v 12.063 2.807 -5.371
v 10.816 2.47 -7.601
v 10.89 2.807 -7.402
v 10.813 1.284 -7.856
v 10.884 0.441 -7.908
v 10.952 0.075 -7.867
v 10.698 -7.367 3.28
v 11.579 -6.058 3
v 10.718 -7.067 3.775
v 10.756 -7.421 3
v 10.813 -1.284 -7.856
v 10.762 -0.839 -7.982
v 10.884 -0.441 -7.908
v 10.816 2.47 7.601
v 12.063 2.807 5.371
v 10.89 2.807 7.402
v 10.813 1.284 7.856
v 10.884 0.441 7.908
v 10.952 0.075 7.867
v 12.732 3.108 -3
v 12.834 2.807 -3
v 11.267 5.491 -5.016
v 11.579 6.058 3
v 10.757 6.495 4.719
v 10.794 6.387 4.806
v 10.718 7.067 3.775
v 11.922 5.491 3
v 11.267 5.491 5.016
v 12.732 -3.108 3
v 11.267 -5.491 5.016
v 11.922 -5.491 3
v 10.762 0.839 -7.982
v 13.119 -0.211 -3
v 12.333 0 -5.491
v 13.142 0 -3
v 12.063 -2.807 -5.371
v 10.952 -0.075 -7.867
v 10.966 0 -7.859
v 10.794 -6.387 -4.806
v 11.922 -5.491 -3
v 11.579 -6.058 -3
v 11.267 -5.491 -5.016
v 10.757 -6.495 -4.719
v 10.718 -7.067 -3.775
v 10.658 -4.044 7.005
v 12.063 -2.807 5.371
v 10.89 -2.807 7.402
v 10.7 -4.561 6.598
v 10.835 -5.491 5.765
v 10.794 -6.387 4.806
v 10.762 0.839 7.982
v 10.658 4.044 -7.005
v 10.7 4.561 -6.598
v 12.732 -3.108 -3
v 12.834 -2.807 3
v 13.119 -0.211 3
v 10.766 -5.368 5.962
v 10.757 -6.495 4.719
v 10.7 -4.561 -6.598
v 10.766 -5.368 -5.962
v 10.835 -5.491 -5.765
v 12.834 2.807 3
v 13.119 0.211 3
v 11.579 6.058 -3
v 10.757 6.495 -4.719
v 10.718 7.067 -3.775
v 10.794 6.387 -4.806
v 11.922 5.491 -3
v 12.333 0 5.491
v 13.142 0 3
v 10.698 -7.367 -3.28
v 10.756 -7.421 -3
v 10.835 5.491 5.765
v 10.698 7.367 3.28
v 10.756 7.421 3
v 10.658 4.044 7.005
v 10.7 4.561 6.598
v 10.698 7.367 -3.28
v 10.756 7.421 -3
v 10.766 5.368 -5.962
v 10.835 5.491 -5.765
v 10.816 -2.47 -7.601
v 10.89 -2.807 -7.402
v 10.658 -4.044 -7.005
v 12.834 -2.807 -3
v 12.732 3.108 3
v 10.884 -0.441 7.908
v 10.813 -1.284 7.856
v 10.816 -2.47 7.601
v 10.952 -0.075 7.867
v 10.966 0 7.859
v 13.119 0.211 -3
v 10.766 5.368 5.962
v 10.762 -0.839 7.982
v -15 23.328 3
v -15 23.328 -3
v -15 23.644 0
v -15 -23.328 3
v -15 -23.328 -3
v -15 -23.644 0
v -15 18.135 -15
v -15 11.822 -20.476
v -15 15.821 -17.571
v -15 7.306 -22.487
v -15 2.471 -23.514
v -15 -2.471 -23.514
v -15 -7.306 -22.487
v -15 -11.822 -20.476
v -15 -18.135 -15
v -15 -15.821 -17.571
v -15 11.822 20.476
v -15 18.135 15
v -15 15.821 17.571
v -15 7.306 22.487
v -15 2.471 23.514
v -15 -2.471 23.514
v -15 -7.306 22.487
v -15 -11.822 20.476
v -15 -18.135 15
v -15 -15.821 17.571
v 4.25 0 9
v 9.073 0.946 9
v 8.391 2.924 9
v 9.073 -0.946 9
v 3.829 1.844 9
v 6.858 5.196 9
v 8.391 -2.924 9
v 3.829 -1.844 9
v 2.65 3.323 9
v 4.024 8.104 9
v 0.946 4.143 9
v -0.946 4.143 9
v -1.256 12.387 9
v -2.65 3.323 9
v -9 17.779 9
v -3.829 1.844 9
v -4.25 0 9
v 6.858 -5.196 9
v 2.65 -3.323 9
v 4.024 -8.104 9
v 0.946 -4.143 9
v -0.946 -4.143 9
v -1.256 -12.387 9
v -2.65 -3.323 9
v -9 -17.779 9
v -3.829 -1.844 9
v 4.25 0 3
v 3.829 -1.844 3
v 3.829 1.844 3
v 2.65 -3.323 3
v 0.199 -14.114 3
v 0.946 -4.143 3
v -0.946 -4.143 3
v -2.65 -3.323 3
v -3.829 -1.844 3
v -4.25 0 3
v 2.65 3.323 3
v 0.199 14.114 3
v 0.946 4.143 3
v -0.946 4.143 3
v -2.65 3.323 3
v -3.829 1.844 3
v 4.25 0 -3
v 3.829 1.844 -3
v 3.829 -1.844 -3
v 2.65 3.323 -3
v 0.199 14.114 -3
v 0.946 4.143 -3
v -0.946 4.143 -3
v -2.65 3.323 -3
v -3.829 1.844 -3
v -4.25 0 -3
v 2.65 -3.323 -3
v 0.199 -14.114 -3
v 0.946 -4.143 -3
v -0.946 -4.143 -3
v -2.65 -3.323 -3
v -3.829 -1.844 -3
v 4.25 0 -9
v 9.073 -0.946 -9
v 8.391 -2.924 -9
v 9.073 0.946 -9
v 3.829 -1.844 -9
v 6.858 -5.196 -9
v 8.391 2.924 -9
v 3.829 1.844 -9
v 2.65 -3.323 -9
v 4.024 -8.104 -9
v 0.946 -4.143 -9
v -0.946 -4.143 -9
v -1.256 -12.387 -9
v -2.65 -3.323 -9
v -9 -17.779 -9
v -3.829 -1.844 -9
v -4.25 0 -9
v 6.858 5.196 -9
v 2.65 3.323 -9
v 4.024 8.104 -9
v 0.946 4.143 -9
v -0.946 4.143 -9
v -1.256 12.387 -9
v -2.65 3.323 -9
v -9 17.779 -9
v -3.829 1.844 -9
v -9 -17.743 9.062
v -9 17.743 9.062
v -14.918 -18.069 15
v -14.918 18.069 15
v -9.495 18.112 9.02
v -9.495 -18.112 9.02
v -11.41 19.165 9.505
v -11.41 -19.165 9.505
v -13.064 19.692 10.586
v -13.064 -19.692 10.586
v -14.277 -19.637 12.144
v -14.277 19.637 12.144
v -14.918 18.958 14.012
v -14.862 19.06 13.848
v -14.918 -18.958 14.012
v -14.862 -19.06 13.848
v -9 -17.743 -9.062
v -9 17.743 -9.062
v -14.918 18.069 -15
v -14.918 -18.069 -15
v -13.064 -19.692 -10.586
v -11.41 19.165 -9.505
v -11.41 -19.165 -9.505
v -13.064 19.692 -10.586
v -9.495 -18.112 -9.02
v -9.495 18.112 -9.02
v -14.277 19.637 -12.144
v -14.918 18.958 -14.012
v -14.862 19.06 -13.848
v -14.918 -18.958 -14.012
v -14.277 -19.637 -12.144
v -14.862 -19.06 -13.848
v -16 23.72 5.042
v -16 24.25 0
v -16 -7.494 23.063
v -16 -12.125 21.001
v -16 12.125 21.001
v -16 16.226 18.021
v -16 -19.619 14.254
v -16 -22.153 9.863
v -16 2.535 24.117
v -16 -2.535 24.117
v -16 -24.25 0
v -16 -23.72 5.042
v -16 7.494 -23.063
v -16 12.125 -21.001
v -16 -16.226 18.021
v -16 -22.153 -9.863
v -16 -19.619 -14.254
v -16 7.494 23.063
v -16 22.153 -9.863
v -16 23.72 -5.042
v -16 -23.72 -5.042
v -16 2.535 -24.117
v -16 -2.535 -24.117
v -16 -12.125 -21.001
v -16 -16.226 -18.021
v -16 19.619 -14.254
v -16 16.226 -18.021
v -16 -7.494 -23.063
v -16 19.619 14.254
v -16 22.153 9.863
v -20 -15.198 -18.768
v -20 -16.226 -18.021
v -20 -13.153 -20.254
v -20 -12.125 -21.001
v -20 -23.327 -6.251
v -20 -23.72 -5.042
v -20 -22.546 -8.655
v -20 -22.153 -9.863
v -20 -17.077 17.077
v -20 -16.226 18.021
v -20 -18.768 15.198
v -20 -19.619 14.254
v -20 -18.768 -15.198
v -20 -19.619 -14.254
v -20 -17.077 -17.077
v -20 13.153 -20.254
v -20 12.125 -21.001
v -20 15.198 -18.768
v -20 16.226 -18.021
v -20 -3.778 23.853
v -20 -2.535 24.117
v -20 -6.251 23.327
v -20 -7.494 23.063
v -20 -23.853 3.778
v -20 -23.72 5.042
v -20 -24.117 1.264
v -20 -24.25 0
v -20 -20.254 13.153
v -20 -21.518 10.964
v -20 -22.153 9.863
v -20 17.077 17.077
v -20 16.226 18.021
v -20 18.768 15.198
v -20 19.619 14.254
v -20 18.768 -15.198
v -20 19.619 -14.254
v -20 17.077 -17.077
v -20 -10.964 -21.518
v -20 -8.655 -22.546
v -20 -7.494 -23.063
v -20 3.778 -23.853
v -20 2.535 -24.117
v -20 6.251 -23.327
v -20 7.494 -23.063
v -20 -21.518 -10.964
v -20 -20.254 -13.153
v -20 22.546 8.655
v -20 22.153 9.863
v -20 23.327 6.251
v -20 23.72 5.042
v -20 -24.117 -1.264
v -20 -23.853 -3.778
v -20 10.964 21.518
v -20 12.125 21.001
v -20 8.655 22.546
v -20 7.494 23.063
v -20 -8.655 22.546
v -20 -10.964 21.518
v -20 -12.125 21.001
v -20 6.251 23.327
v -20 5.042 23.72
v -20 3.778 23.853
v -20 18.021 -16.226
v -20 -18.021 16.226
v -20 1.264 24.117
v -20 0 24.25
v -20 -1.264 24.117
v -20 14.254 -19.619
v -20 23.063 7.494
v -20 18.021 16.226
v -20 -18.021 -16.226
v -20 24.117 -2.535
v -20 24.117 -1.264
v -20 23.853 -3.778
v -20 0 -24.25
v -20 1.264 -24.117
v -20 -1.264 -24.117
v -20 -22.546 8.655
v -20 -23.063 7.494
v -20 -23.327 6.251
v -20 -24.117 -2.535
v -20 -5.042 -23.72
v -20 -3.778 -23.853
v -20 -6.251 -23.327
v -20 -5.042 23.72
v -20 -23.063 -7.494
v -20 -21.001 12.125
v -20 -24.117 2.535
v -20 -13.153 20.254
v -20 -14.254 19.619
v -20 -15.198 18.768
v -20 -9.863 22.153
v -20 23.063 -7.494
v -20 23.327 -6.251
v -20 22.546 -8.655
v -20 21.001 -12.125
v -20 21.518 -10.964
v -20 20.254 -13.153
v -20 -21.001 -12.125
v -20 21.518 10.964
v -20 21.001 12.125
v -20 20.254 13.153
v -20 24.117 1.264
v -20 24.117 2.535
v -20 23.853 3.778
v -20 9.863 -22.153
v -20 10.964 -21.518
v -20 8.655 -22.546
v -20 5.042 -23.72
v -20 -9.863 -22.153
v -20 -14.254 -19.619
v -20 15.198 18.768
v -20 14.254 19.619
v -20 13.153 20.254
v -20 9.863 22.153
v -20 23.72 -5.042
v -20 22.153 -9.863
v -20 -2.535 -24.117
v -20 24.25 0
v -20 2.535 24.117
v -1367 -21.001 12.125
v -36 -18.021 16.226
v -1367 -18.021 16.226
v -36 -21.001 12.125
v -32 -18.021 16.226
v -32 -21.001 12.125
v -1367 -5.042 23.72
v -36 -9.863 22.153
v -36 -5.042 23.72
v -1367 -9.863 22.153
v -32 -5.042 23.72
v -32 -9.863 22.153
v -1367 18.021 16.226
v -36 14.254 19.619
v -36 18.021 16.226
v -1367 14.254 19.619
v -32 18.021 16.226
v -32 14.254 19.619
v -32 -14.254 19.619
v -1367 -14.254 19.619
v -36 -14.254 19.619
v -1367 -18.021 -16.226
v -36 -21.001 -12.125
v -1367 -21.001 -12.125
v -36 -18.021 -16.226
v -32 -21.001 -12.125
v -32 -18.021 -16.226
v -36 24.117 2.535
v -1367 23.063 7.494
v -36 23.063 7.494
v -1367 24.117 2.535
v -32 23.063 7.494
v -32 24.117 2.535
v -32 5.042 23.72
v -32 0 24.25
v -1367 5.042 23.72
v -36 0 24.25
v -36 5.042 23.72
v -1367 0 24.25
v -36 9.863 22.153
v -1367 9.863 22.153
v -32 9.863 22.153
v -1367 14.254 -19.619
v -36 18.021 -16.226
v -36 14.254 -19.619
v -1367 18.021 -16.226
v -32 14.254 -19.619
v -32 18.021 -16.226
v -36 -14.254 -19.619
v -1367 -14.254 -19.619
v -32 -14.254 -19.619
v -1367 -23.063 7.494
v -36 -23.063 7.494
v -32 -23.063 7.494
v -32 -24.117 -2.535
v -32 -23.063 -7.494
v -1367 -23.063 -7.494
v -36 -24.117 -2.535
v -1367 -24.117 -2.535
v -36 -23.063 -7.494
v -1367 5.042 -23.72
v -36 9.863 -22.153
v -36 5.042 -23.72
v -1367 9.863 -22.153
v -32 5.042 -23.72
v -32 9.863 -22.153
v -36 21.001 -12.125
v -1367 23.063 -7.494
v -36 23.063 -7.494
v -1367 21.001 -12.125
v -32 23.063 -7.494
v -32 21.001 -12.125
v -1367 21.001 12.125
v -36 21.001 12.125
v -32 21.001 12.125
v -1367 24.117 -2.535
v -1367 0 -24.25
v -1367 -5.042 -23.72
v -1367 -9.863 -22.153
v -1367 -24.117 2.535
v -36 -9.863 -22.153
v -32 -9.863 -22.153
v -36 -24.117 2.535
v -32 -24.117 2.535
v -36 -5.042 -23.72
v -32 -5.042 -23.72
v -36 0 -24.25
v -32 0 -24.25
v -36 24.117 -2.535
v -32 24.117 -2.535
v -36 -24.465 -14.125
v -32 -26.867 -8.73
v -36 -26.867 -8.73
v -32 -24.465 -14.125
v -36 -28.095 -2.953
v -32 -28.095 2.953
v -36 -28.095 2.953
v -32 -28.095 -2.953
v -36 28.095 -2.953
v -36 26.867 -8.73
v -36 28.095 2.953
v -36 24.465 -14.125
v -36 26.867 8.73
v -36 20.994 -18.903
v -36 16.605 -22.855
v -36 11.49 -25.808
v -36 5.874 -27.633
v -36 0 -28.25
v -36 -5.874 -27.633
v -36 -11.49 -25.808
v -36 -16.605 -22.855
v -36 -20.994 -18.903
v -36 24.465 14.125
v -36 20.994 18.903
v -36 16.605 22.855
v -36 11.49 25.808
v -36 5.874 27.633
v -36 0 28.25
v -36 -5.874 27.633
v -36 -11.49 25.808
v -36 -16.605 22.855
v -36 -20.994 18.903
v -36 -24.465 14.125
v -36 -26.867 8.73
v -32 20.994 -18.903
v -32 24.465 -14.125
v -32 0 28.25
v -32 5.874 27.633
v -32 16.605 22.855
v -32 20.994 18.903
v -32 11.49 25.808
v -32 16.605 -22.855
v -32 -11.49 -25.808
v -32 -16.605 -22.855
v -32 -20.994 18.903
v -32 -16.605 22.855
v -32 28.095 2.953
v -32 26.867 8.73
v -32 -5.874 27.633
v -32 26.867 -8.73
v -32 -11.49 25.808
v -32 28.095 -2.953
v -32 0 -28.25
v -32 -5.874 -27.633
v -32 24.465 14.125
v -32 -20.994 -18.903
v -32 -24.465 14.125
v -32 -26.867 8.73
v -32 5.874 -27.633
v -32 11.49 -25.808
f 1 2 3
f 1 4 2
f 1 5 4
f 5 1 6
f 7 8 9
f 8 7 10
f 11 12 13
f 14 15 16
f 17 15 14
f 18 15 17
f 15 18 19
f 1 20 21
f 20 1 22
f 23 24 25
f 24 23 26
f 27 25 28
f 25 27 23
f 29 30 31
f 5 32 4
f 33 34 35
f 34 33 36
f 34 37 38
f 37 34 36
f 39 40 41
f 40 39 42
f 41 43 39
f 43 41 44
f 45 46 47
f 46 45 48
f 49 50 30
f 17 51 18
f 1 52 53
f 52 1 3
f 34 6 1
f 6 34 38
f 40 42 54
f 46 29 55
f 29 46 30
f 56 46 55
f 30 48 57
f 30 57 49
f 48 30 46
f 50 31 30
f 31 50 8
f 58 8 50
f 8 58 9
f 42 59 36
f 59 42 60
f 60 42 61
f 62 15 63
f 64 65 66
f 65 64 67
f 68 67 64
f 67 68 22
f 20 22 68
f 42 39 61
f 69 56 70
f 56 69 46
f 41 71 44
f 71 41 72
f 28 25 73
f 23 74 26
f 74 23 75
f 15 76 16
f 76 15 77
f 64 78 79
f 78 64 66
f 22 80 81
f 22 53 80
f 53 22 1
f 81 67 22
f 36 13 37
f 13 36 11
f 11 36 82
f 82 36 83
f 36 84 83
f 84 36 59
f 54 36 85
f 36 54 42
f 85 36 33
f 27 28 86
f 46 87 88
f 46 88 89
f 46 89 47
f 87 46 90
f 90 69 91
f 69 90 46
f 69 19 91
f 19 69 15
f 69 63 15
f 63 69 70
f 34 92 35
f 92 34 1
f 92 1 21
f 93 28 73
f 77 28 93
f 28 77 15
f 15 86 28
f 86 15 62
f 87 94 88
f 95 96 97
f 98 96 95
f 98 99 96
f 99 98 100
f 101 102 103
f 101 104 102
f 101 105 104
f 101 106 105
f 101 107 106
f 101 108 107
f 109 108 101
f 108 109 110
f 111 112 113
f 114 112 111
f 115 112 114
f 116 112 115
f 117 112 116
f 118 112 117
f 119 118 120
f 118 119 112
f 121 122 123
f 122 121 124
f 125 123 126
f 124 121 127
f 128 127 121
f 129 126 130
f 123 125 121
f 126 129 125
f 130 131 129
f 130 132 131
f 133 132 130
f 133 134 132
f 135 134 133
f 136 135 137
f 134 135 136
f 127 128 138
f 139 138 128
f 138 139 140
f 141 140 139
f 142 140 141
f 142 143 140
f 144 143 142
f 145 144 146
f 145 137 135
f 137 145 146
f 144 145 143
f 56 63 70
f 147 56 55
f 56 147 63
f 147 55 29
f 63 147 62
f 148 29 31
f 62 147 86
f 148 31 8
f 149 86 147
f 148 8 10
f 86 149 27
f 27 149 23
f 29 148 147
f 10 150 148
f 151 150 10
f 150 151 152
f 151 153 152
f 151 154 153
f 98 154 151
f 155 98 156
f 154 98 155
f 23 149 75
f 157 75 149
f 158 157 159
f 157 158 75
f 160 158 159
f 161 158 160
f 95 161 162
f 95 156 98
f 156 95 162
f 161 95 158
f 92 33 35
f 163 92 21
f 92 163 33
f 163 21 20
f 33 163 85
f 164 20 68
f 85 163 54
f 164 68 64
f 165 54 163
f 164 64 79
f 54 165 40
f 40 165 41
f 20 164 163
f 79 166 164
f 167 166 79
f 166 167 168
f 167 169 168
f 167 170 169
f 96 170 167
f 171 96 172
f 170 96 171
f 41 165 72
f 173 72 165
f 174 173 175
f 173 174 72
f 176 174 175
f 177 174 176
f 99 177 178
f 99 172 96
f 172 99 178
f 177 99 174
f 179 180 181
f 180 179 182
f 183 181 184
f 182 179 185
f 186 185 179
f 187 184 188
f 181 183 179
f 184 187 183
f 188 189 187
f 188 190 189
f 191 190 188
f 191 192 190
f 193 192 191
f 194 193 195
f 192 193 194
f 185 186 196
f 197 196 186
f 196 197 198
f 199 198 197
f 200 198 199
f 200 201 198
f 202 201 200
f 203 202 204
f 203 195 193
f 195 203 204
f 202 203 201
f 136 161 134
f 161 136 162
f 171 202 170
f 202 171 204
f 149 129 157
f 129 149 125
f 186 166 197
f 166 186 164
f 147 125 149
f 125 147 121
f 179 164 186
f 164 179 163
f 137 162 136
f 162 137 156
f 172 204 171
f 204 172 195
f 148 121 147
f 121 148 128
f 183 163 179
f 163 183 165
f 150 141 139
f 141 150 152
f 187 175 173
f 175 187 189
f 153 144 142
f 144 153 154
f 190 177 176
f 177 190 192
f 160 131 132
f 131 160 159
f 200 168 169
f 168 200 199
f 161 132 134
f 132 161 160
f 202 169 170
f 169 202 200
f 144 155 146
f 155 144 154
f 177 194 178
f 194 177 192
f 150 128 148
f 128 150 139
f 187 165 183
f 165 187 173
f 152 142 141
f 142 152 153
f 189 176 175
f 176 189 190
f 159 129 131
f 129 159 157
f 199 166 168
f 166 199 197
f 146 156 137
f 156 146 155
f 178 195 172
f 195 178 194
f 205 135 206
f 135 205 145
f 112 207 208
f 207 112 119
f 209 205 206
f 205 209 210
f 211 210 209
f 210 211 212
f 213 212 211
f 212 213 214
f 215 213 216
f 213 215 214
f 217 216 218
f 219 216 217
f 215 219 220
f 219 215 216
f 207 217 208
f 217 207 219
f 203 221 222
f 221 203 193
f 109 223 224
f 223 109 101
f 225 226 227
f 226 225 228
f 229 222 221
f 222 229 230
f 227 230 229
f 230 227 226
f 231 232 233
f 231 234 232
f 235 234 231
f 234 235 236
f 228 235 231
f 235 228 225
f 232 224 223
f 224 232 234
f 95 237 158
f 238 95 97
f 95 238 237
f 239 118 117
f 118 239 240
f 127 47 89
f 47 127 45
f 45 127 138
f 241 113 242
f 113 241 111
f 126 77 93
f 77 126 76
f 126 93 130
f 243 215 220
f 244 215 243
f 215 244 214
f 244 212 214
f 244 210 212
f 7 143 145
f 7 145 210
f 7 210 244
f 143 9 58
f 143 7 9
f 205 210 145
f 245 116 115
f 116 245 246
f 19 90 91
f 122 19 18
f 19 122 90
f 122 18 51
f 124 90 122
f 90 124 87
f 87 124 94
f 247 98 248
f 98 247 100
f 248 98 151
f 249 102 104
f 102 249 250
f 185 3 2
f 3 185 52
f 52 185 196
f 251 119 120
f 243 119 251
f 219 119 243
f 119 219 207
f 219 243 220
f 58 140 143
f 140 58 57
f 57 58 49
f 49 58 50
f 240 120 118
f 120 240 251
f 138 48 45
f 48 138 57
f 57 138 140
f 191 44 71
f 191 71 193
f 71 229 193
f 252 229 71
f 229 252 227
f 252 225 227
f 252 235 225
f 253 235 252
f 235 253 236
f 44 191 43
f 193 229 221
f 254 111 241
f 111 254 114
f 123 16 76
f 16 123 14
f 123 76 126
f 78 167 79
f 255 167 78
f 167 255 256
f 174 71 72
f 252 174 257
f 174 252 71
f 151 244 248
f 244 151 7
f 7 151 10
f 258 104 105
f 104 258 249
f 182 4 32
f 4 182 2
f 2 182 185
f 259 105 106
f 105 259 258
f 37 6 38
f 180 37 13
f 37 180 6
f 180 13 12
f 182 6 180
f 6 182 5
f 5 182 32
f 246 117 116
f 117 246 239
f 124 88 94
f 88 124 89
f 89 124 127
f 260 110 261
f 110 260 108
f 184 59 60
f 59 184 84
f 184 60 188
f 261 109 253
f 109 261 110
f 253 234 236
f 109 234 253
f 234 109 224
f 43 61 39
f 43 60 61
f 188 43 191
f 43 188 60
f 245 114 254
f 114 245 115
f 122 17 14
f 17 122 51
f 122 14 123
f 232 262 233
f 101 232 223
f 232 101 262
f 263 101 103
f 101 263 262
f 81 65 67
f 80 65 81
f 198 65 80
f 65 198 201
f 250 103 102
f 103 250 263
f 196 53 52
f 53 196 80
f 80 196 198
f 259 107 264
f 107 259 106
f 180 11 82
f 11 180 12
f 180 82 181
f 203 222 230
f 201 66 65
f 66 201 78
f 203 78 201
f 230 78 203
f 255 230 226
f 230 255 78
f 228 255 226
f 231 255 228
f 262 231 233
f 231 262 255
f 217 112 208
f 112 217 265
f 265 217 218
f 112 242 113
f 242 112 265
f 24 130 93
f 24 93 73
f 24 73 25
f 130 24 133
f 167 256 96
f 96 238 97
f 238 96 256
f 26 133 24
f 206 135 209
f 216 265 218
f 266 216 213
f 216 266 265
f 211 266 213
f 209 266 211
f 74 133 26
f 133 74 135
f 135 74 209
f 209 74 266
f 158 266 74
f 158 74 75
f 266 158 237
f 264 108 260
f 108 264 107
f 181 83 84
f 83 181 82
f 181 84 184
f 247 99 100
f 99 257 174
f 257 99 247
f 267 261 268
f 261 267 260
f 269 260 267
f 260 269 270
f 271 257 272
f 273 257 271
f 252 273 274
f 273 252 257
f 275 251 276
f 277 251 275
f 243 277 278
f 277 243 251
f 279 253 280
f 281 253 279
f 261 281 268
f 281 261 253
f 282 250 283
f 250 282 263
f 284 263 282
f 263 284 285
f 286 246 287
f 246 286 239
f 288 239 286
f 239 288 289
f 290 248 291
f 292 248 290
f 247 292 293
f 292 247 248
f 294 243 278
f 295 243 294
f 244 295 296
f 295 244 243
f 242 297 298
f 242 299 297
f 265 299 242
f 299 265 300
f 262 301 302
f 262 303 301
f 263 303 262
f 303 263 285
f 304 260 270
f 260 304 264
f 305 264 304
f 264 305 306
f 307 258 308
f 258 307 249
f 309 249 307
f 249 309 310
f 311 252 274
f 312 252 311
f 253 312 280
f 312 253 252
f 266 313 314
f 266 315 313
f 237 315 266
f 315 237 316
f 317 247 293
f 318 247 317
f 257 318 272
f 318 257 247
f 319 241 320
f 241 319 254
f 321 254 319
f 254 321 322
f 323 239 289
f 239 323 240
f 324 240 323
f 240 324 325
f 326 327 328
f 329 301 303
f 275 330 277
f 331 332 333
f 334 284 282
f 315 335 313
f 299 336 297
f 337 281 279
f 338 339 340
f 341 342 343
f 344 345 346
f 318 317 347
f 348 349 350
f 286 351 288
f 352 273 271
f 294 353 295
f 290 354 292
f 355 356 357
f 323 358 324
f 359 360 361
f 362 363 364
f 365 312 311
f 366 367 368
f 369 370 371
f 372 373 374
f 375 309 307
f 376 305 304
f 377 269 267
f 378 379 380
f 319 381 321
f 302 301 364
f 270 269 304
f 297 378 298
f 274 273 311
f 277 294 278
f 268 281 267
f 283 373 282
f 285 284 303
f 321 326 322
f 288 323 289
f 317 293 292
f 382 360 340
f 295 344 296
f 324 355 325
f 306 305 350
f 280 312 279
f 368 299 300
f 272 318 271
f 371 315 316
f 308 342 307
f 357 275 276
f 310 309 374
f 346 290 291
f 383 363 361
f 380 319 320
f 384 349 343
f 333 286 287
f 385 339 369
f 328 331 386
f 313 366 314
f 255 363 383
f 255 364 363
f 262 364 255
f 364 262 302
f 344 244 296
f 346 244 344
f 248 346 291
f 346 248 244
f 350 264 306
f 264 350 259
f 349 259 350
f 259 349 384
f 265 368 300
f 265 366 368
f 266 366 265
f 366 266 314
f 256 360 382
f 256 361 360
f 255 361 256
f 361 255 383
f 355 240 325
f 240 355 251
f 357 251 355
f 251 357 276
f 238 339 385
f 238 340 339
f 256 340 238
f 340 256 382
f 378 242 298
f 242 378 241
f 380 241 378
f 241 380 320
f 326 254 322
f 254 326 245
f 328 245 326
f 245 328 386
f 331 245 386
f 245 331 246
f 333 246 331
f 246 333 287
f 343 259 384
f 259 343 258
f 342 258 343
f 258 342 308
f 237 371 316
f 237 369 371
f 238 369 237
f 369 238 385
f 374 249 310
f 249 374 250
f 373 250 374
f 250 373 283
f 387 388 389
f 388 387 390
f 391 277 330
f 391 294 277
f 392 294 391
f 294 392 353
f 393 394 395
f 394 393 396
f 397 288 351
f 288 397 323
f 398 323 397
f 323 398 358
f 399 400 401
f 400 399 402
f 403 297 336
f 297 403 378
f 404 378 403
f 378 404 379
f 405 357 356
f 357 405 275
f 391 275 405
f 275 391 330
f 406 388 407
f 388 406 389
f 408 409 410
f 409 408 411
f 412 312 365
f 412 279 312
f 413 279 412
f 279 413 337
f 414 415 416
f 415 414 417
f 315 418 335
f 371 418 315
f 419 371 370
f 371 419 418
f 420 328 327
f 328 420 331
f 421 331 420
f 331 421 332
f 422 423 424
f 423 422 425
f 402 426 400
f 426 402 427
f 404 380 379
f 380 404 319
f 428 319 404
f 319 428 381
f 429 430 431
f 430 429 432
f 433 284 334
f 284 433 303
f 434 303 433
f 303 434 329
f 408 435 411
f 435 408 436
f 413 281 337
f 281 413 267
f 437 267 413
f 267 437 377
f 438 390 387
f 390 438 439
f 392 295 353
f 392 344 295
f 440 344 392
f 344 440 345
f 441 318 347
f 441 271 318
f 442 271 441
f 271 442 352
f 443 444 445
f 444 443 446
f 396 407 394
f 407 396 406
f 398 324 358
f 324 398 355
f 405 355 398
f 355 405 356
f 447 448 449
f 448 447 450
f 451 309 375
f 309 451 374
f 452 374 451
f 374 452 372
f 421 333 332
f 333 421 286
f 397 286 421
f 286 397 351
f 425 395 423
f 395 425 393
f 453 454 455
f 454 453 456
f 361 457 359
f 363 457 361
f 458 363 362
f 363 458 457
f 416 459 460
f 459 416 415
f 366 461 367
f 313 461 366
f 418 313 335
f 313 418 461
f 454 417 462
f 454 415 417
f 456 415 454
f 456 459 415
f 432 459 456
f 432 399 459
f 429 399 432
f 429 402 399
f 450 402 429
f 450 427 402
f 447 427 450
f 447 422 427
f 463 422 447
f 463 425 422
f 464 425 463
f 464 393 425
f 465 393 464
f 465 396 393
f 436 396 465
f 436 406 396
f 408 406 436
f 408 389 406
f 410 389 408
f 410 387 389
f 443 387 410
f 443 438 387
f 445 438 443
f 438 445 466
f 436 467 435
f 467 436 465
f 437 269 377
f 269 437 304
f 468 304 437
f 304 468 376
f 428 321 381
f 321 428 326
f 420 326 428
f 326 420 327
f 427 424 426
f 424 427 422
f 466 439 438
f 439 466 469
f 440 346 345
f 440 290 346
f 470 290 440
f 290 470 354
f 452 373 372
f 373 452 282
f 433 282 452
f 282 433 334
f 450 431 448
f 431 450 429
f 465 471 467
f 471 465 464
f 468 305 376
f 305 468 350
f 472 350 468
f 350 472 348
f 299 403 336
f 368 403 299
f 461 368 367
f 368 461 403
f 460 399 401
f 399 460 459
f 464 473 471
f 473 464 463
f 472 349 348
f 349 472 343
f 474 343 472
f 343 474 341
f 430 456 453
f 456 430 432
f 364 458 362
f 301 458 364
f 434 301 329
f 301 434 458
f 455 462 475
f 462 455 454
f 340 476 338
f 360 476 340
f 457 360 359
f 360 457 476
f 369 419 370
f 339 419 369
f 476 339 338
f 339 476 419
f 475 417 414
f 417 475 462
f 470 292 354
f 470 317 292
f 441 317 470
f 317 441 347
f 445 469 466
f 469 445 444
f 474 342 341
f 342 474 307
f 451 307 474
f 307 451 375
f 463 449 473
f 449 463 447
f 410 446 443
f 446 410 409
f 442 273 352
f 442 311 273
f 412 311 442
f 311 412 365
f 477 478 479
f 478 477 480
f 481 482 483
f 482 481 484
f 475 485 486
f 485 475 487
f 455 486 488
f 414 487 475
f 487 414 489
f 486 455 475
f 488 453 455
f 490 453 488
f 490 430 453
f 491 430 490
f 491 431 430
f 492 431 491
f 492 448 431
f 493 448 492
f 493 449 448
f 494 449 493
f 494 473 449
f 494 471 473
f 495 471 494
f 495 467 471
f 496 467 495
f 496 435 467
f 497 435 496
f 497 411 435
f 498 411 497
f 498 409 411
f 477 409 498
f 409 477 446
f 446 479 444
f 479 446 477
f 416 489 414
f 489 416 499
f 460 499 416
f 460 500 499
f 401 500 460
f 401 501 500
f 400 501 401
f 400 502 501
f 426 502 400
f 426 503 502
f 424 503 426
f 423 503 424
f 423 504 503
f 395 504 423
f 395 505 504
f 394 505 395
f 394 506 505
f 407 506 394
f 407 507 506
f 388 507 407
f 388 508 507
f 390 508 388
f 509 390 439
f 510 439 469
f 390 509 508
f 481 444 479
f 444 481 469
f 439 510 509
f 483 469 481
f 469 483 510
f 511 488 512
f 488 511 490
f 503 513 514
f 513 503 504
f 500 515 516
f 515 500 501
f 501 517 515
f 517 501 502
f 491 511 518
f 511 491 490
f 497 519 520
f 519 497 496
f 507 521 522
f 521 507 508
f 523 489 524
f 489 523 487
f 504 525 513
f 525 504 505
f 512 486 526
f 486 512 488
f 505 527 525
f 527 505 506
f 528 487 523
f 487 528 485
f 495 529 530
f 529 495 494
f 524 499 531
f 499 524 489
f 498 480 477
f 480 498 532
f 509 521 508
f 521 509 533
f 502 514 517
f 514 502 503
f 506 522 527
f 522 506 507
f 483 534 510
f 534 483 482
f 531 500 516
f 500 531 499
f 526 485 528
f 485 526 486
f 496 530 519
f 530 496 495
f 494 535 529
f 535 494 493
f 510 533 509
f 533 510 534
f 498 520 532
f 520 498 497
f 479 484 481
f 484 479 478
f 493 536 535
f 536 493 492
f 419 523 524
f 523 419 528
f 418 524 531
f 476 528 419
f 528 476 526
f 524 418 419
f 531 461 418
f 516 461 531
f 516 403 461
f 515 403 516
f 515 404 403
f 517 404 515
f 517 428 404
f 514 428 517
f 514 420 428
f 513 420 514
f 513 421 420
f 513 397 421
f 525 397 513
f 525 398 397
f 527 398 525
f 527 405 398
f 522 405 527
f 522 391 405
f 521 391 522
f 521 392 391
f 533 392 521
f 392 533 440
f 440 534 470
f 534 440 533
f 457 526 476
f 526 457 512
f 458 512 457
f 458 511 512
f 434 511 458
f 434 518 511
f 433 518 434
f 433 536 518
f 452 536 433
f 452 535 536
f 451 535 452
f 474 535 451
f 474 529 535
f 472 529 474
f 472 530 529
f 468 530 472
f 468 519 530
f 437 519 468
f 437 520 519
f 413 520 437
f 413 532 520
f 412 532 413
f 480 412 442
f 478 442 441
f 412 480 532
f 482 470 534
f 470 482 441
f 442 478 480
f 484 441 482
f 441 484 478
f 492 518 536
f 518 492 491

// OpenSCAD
// file: ../Parts/ShplRoz.scad
ShplRoz();

    gikLen = 2200;
    diamVnesh = 48.5;
    platformThickns = 5;
    ushiThickns = 6;
    lenA = 40;
    shplintDia = 8.5;
    shplintHoleHeight = 15;

module ShplRoz() {

    intersection() {
        
        union() {
            
            //Цилиндр
            translate([+platformThickns-1,0,0]) 
            rotate([0,-90,0]) 
            cylinder(h=shplintHoleHeight+platformThickns, d=diamVnesh);   // Эта часть такая, какая нужна.    

            // Сфера
            sphere(d = ushiThickns*4.5);
       } 

       ConicBar();

    }

    //Цилиндр затычки, высотой 4мм 
    translate([-shplintHoleHeight-1,0,0]) 
    rotate([0,-90,0]) 
    cylinder(h=platformThickns-1, d=diamVnesh);    

}




module ConicBar() {
    
    intersection() { 

        union() {
                                        
            // Шайба 1мм
            translate([-shplintHoleHeight,0,0]) 
            rotate([0,-90,0]) 
            cylinder(h=1, d=diamVnesh);
    
            // Захваты упора с дырками.
            difference(){ 
                    
                // Захваты упора.
                union() {  
                    translate([-shplintHoleHeight,ushiThickns /2 ,-diamVnesh/2]) 
                    cube([lenA,ushiThickns ,diamVnesh]);    

                    translate([-shplintHoleHeight,-3*ushiThickns /2 ,-diamVnesh/2]) 
                    cube([lenA,ushiThickns ,diamVnesh]);
                        
                }
                    
                // Дырки для шплинта ( вырез цилиндра )
                translate([0 ,-1-ushiThickns*3/2,0]) 
                rotate([-90,0,0]) 
                cylinder(h=ushiThickns *3+2, d=shplintDia); 

            }
        
            // Стыки
            difference() {

                translate([-shplintHoleHeight,3*ushiThickns /2 ,-diamVnesh/2]) 
                cube([ushiThickns,ushiThickns ,diamVnesh]);    

                translate([-shplintHoleHeight + ushiThickns,5*ushiThickns/2,-diamVnesh/2]) 
                rotate([0,0,0]) 
                cylinder(h=diamVnesh, d=ushiThickns*2  );       
            }
            difference() {

                translate([-shplintHoleHeight,-5*ushiThickns /2 ,-diamVnesh/2]) 
                cube([ushiThickns,ushiThickns ,diamVnesh]);      

                translate([-shplintHoleHeight + ushiThickns,-5*ushiThickns/2,-diamVnesh/2]) 
                rotate([0,0,0]) 
                cylinder(h=diamVnesh, d=ushiThickns*2  );       
            }   
        
        }

        // Конус. Нужно оставить то, что в нём.
        translate([-shplintHoleHeight-1,0,0]) 
        rotate([0,90,0]) 
        cylinder(h=platformThickns*8, d1=diamVnesh, d2=0);   // Пересекаем с этим конусом.
   
    } // Пересечение
}   // Модуль ConicBar
// main file
use <../Parts/ShplRoz.scad>;

    legLen = 1347;
    holeOffset = 20;
    diamVnesh = 48.5;
/*
    platformThickns = 5;
    ushiThickns = 6;
    lenA = 40;
    shplintDia = 8.5;
    shplintHoleHeight = 15;
*/

//translate([legLen+holeOffset,0,0]) 
PyraRL();

module PyraRL() {
    
//    $fn = 50;
    
    translate([-holeOffset,0,0]) 
    rotate([0,-90,0]) 
    cylinder(h=legLen, d=diamVnesh);        

    rotate([90,0,0]) 
    ShplRoz();

//    translate([-holeOffset*2-legLen,0,0]) rotate([90,0,180]) ShplRoz();

    translate([ -holeOffset - 12 , 0 , 0 ]) 
    rotate([ 0 , -90 , 0 ]) 
    cylinder( h=4 , d=diamVnesh + 8);        
    


}
